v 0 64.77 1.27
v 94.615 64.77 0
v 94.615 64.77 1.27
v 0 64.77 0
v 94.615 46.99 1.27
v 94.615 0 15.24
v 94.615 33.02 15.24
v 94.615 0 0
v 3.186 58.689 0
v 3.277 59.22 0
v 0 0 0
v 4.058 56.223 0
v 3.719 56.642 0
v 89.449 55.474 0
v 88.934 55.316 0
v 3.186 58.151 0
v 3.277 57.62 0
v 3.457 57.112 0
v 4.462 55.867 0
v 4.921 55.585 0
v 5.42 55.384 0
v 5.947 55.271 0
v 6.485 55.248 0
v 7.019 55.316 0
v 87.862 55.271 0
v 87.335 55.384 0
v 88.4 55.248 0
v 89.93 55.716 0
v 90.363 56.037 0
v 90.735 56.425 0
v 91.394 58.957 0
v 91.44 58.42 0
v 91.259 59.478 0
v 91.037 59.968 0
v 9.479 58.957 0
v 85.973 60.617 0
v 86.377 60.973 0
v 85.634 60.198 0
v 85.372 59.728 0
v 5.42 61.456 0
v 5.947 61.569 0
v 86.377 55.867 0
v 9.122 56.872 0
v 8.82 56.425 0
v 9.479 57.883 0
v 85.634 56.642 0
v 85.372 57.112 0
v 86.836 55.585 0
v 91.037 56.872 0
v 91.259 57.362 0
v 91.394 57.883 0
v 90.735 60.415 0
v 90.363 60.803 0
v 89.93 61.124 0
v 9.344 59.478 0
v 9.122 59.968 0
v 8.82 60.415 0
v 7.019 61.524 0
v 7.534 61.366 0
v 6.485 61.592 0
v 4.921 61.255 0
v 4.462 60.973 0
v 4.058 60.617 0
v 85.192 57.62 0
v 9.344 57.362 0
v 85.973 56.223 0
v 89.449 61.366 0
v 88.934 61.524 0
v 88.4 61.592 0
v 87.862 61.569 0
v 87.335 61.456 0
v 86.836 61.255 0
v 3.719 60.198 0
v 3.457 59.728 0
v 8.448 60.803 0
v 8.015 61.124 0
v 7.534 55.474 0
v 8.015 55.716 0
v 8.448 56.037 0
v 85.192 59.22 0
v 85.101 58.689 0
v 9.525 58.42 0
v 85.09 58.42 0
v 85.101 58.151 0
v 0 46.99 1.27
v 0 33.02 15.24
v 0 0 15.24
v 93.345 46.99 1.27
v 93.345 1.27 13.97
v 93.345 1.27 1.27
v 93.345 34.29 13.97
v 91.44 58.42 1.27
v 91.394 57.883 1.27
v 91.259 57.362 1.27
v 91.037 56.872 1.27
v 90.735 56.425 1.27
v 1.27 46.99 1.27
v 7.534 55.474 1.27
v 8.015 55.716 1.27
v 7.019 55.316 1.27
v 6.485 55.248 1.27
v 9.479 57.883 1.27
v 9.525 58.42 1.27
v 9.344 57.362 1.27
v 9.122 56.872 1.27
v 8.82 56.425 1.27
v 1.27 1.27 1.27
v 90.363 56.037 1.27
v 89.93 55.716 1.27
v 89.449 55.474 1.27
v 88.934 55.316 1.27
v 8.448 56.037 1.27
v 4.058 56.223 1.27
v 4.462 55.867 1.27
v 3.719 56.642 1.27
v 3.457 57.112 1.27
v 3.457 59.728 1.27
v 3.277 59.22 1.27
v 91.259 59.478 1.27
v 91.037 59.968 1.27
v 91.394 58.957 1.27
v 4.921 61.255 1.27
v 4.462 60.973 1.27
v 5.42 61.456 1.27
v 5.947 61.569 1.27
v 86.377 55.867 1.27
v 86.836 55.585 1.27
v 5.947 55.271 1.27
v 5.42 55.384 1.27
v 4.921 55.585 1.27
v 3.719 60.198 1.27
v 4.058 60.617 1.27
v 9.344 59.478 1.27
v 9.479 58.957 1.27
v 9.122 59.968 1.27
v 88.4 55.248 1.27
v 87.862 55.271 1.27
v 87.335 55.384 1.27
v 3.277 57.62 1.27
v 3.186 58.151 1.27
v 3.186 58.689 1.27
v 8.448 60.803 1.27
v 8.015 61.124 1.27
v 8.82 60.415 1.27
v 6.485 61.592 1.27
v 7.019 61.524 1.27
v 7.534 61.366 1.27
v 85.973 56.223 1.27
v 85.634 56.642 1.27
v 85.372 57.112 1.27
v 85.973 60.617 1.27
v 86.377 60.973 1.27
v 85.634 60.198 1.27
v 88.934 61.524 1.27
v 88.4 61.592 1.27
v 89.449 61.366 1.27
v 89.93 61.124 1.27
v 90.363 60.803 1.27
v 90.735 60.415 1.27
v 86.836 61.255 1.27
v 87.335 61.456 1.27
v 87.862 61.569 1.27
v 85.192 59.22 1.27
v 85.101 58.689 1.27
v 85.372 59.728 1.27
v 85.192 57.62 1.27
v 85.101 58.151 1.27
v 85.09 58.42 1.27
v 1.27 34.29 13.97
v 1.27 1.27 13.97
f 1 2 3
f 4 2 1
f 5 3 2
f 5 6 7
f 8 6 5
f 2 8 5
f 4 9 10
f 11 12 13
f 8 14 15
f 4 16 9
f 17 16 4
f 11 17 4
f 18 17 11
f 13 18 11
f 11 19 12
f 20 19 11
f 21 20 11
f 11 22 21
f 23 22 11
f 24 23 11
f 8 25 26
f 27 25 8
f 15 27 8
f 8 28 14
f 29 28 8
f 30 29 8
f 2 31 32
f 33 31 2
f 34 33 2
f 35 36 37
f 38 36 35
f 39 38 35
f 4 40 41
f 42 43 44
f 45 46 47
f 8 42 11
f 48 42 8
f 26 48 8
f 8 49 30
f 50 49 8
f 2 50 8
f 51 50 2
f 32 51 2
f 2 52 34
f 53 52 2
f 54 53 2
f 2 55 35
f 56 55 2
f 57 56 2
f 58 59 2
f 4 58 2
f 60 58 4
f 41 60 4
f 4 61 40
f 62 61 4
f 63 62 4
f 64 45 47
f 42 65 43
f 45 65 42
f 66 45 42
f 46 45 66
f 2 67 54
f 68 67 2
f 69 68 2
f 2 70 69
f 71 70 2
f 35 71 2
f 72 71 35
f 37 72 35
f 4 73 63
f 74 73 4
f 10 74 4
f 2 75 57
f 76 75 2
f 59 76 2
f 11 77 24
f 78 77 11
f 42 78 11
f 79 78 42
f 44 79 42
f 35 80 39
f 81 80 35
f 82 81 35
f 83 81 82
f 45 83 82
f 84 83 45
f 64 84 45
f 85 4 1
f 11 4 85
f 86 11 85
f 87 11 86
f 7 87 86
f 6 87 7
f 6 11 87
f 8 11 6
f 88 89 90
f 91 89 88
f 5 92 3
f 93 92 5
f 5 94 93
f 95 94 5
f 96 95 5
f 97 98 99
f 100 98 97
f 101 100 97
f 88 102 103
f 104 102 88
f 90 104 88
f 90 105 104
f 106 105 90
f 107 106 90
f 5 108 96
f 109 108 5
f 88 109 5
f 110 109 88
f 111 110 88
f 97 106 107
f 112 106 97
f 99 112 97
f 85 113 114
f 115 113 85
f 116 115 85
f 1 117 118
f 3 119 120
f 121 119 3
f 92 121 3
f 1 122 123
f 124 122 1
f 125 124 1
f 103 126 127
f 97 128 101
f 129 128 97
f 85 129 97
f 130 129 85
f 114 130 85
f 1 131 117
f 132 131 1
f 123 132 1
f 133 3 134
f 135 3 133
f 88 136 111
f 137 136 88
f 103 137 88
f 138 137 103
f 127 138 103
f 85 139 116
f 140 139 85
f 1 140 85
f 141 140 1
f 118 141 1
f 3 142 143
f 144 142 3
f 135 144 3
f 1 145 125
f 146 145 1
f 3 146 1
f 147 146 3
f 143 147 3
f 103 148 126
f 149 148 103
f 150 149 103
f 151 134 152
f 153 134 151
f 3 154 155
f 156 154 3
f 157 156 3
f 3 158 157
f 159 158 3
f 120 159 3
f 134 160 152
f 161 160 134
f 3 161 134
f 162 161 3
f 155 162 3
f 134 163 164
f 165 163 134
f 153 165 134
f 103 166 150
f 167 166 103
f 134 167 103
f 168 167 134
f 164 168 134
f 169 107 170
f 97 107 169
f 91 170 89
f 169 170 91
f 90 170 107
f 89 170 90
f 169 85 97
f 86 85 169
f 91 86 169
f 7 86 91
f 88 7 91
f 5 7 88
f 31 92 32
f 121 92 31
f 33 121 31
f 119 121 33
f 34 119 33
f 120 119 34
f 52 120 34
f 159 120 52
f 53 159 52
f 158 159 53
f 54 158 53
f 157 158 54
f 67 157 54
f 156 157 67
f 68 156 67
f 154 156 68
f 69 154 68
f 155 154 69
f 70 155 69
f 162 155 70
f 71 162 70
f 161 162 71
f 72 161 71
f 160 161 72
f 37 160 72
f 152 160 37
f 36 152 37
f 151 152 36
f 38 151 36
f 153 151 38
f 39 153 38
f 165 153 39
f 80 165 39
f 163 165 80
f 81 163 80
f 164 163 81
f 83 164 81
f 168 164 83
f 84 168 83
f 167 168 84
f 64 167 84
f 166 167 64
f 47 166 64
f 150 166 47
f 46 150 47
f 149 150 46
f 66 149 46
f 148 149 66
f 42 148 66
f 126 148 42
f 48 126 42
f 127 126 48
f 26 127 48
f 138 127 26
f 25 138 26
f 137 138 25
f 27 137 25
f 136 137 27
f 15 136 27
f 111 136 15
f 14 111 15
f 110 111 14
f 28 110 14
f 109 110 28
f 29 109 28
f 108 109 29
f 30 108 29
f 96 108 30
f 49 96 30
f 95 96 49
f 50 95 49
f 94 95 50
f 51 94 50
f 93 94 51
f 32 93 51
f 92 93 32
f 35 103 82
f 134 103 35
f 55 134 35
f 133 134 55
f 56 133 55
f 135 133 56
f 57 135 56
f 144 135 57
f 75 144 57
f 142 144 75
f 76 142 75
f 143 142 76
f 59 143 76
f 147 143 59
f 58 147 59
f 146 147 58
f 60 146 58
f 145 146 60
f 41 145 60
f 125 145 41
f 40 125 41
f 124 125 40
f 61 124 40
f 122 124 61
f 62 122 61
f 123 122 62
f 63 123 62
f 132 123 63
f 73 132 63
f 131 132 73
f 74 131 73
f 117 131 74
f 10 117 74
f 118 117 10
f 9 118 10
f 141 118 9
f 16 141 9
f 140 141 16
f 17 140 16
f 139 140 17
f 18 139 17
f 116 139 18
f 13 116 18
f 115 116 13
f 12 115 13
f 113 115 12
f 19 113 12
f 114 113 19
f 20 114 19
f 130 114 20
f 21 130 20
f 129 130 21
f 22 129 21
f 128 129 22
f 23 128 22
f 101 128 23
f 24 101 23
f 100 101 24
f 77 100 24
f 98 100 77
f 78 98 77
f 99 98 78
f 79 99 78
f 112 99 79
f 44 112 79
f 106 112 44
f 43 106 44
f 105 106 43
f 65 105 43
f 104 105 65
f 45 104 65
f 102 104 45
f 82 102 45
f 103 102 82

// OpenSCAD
module object1(scale) {polyhedron( points=[[94.61499786376953,64.77000427246094,1.2699998617172241],[94.61499786376953,64.77000427246094,0],[0,64.77000427246094,1.2699998617172241],[0,64.77000427246094,1.2699998617172241],[94.61499786376953,64.77000427246094,0],[0,64.77000427246094,0],[94.61499786376953,64.77000427246094,0],[94.61499786376953,64.77000427246094,1.2699998617172241],[94.61499786376953,46.98999786376953,1.2699998617172241],[94.61499786376953,33.02000045776367,15.239999771118164],[94.61499786376953,0,15.239999771118164],[94.61499786376953,46.98999786376953,1.2699998617172241],[94.61499786376953,46.98999786376953,1.2699998617172241],[94.61499786376953,0,15.239999771118164],[94.61499786376953,0,0],[94.61499786376953,46.98999786376953,1.2699998617172241],[94.61499786376953,0,0],[94.61499786376953,64.77000427246094,0],[3.277446985244751,59.22003173828125,0],[3.1864383220672607,58.68925857543945,0],[0,64.77000427246094,0],[3.7194788455963135,56.64208221435547,0],[4.0577874183654785,56.22309494018555,0],[0,0,0],[88.93389892578125,55.316261291503906,0],[89.44881439208984,55.47395324707031,0],[94.61499786376953,0,0],[3.1864383220672607,58.68925857543945,0],[3.1864383220672607,58.15074157714844,0],[0,64.77000427246094,0],[0,64.77000427246094,0],[3.1864383220672607,58.15074157714844,0],[3.277446985244751,57.61996841430664,0],[0,64.77000427246094,0],[3.277446985244751,57.61996841430664,0],[0,0,0],[0,0,0],[3.277446985244751,57.61996841430664,0],[3.4568495750427246,57.112213134765625,0],[0,0,0],[3.4568495750427246,57.112213134765625,0],[3.7194788455963135,56.64208221435547,0],[4.0577874183654785,56.22309494018555,0],[4.462037086486816,55.8673095703125,0],[0,0,0],[0,0,0],[4.462037086486816,55.8673095703125,0],[4.920601844787598,55.5849609375,0],[0,0,0],[4.920601844787598,55.5849609375,0],[5.420286178588867,55.38417053222656,0],[5.420286178588867,55.38417053222656,0],[5.946718215942383,55.27071762084961,0],[0,0,0],[0,0,0],[5.946718215942383,55.27071762084961,0],[6.484750747680664,55.24786376953125,0],[0,0,0],[6.484750747680664,55.24786376953125,0],[7.018905162811279,55.316261291503906,0],[87.33528900146484,55.38417053222656,0],[87.8617172241211,55.27071762084961,0],[94.61499786376953,0,0],[94.61499786376953,0,0],[87.8617172241211,55.27071762084961,0],[88.39974975585938,55.24786376953125,0],[94.61499786376953,0,0],[88.39974975585938,55.24786376953125,0],[88.93389892578125,55.316261291503906,0],[89.44881439208984,55.47395324707031,0],[89.92967224121094,55.71639633178711,0],[94.61499786376953,0,0],[94.61499786376953,0,0],[89.92967224121094,55.71639633178711,0],[90.36264038085938,56.03661346435547,0],[94.61499786376953,0,0],[90.36264038085938,56.03661346435547,0],[90.73526763916016,56.42539978027344,0],[91.44000244140625,58.41999816894531,0],[91.39432525634766,58.95657730102539,0],[94.61499786376953,64.77000427246094,0],[94.61499786376953,64.77000427246094,0],[91.39432525634766,58.95657730102539,0],[91.25862884521484,59.47772216796875,0],[94.61499786376953,64.77000427246094,0],[91.25862884521484,59.47772216796875,0],[91.03681945800781,59.96842956542969,0],[86.37703704833984,60.97269058227539,0],[85.97278594970703,60.616905212402344,0],[9.479329109191895,58.95657730102539,0],[9.479329109191895,58.95657730102539,0],[85.97278594970703,60.616905212402344,0],[85.63448333740234,60.19791793823242,0],[9.479329109191895,58.95657730102539,0],[85.63448333740234,60.19791793823242,0],[85.3718490600586,59.727787017822266,0],[5.946718215942383,61.56928634643555,0],[5.420286178588867,61.45582962036133,0],[0,64.77000427246094,0],[8.82026195526123,56.42539978027344,0],[9.121820449829102,56.87156677246094,0],[86.37703704833984,55.8673095703125,0],[85.3718490600586,57.112213134765625,0],[85.63448333740234,56.64208221435547,0],[9.479329109191895,57.8834228515625,0],[0,0,0],[86.37703704833984,55.8673095703125,0],[94.61499786376953,0,0],[94.61499786376953,0,0],[86.37703704833984,55.8673095703125,0],[86.83560180664062,55.5849609375,0],[94.61499786376953,0,0],[86.83560180664062,55.5849609375,0],[87.33528900146484,55.38417053222656,0],[90.73526763916016,56.42539978027344,0],[91.03681945800781,56.87156677246094,0],[94.61499786376953,0,0],[94.61499786376953,0,0],[91.03681945800781,56.87156677246094,0],[91.25862884521484,57.362281799316406,0],[94.61499786376953,0,0],[91.25862884521484,57.362281799316406,0],[94.61499786376953,64.77000427246094,0],[94.61499786376953,64.77000427246094,0],[91.25862884521484,57.362281799316406,0],[91.39432525634766,57.8834228515625,0],[94.61499786376953,64.77000427246094,0],[91.39432525634766,57.8834228515625,0],[91.44000244140625,58.41999816894531,0],[91.03681945800781,59.96842956542969,0],[90.73526763916016,60.41459655761719,0],[94.61499786376953,64.77000427246094,0],[94.61499786376953,64.77000427246094,0],[90.73526763916016,60.41459655761719,0],[90.36264038085938,60.803382873535156,0],[94.61499786376953,64.77000427246094,0],[90.36264038085938,60.803382873535156,0],[89.92967224121094,61.12360763549805,0],[9.479329109191895,58.95657730102539,0],[9.343635559082031,59.47772216796875,0],[94.61499786376953,64.77000427246094,0],[94.61499786376953,64.77000427246094,0],[9.343635559082031,59.47772216796875,0],[9.121820449829102,59.96842956542969,0],[94.61499786376953,64.77000427246094,0],[9.121820449829102,59.96842956542969,0],[8.82026195526123,60.41459655761719,0],[94.61499786376953,64.77000427246094,0],[7.533818244934082,61.36604690551758,0],[7.018905162811279,61.523738861083984,0],[94.61499786376953,64.77000427246094,0],[7.018905162811279,61.523738861083984,0],[0,64.77000427246094,0],[0,64.77000427246094,0],[7.018905162811279,61.523738861083984,0],[6.484750747680664,61.592140197753906,0],[0,64.77000427246094,0],[6.484750747680664,61.592140197753906,0],[5.946718215942383,61.56928634643555,0],[5.420286178588867,61.45582962036133,0],[4.920601844787598,61.25503921508789,0],[0,64.77000427246094,0],[0,64.77000427246094,0],[4.920601844787598,61.25503921508789,0],[4.462037086486816,60.97269058227539,0],[0,64.77000427246094,0],[4.462037086486816,60.97269058227539,0],[4.0577874183654785,60.616905212402344,0],[85.3718490600586,57.112213134765625,0],[9.479329109191895,57.8834228515625,0],[85.19244384765625,57.61996841430664,0],[9.121820449829102,56.87156677246094,0],[9.343635559082031,57.362281799316406,0],[86.37703704833984,55.8673095703125,0],[86.37703704833984,55.8673095703125,0],[9.343635559082031,57.362281799316406,0],[9.479329109191895,57.8834228515625,0],[86.37703704833984,55.8673095703125,0],[9.479329109191895,57.8834228515625,0],[85.97278594970703,56.22309494018555,0],[85.97278594970703,56.22309494018555,0],[9.479329109191895,57.8834228515625,0],[85.63448333740234,56.64208221435547,0],[89.92967224121094,61.12360763549805,0],[89.44881439208984,61.36604690551758,0],[94.61499786376953,64.77000427246094,0],[94.61499786376953,64.77000427246094,0],[89.44881439208984,61.36604690551758,0],[88.93389892578125,61.523738861083984,0],[94.61499786376953,64.77000427246094,0],[88.93389892578125,61.523738861083984,0],[88.39974975585938,61.592140197753906,0],[88.39974975585938,61.592140197753906,0],[87.8617172241211,61.56928634643555,0],[94.61499786376953,64.77000427246094,0],[94.61499786376953,64.77000427246094,0],[87.8617172241211,61.56928634643555,0],[87.33528900146484,61.45582962036133,0],[94.61499786376953,64.77000427246094,0],[87.33528900146484,61.45582962036133,0],[9.479329109191895,58.95657730102539,0],[9.479329109191895,58.95657730102539,0],[87.33528900146484,61.45582962036133,0],[86.83560180664062,61.25503921508789,0],[9.479329109191895,58.95657730102539,0],[86.83560180664062,61.25503921508789,0],[86.37703704833984,60.97269058227539,0],[4.0577874183654785,60.616905212402344,0],[3.7194788455963135,60.19791793823242,0],[0,64.77000427246094,0],[0,64.77000427246094,0],[3.7194788455963135,60.19791793823242,0],[3.4568495750427246,59.727787017822266,0],[0,64.77000427246094,0],[3.4568495750427246,59.727787017822266,0],[3.277446985244751,59.22003173828125,0],[8.82026195526123,60.41459655761719,0],[8.447639465332031,60.803382873535156,0],[94.61499786376953,64.77000427246094,0],[94.61499786376953,64.77000427246094,0],[8.447639465332031,60.803382873535156,0],[8.01467514038086,61.12360763549805,0],[94.61499786376953,64.77000427246094,0],[8.01467514038086,61.12360763549805,0],[7.533818244934082,61.36604690551758,0],[7.018905162811279,55.316261291503906,0],[7.533818244934082,55.47395324707031,0],[0,0,0],[0,0,0],[7.533818244934082,55.47395324707031,0],[8.01467514038086,55.71639633178711,0],[0,0,0],[8.01467514038086,55.71639633178711,0],[86.37703704833984,55.8673095703125,0],[86.37703704833984,55.8673095703125,0],[8.01467514038086,55.71639633178711,0],[8.447639465332031,56.03661346435547,0],[86.37703704833984,55.8673095703125,0],[8.447639465332031,56.03661346435547,0],[8.82026195526123,56.42539978027344,0],[85.3718490600586,59.727787017822266,0],[85.19244384765625,59.22003173828125,0],[9.479329109191895,58.95657730102539,0],[9.479329109191895,58.95657730102539,0],[85.19244384765625,59.22003173828125,0],[85.1014404296875,58.68925857543945,0],[9.479329109191895,58.95657730102539,0],[85.1014404296875,58.68925857543945,0],[9.52499771118164,58.41999816894531,0],[9.52499771118164,58.41999816894531,0],[85.1014404296875,58.68925857543945,0],[85.08999633789062,58.41999816894531,0],[9.52499771118164,58.41999816894531,0],[85.08999633789062,58.41999816894531,0],[9.479329109191895,57.8834228515625,0],[9.479329109191895,57.8834228515625,0],[85.08999633789062,58.41999816894531,0],[85.1014404296875,58.15074157714844,0],[9.479329109191895,57.8834228515625,0],[85.1014404296875,58.15074157714844,0],[85.19244384765625,57.61996841430664,0],[0,64.77000427246094,1.2699998617172241],[0,64.77000427246094,0],[0,46.98999786376953,1.2699998617172241],[0,46.98999786376953,1.2699998617172241],[0,64.77000427246094,0],[0,0,0],[0,46.98999786376953,1.2699998617172241],[0,0,0],[0,33.02000045776367,15.239999771118164],[0,33.02000045776367,15.239999771118164],[0,0,0],[0,0,15.239999771118164],[0,33.02000045776367,15.239999771118164],[0,0,15.239999771118164],[94.61499786376953,33.02000045776367,15.239999771118164],[94.61499786376953,33.02000045776367,15.239999771118164],[0,0,15.239999771118164],[94.61499786376953,0,15.239999771118164],[0,0,15.239999771118164],[0,0,0],[94.61499786376953,0,15.239999771118164],[94.61499786376953,0,15.239999771118164],[0,0,0],[94.61499786376953,0,0],[93.34500122070312,1.2699999809265137,1.2699998617172241],[93.34500122070312,1.2699999809265137,13.969999313354492],[93.34500122070312,46.98999786376953,1.2699998617172241],[93.34500122070312,46.98999786376953,1.2699998617172241],[93.34500122070312,1.2699999809265137,13.969999313354492],[93.34500122070312,34.290000915527344,13.969999313354492],[94.61499786376953,64.77000427246094,1.2699998617172241],[91.44000244140625,58.41999816894531,1.2699998617172241],[94.61499786376953,46.98999786376953,1.2699998617172241],[94.61499786376953,46.98999786376953,1.2699998617172241],[91.44000244140625,58.41999816894531,1.2699998617172241],[91.39432525634766,57.8834228515625,1.2699998617172241],[91.39432525634766,57.8834228515625,1.2699998617172241],[91.25862884521484,57.362281799316406,1.2699998617172241],[94.61499786376953,46.98999786376953,1.2699998617172241],[94.61499786376953,46.98999786376953,1.2699998617172241],[91.25862884521484,57.362281799316406,1.2699998617172241],[91.03681945800781,56.87156677246094,1.2699998617172241],[94.61499786376953,46.98999786376953,1.2699998617172241],[91.03681945800781,56.87156677246094,1.2699998617172241],[90.73526763916016,56.42539978027344,1.2699998617172241],[8.01467514038086,55.71639633178711,1.2699998617172241],[7.533818244934082,55.47395324707031,1.2699998617172241],[1.2699998617172241,46.98999786376953,1.2699998617172241],[1.2699998617172241,46.98999786376953,1.2699998617172241],[7.533818244934082,55.47395324707031,1.2699998617172241],[7.018905162811279,55.316261291503906,1.2699998617172241],[1.2699998617172241,46.98999786376953,1.2699998617172241],[7.018905162811279,55.316261291503906,1.2699998617172241],[6.484750747680664,55.24786376953125,1.2699998617172241],[9.52499771118164,58.41999816894531,1.2699998617172241],[9.479329109191895,57.8834228515625,1.2699998617172241],[93.34500122070312,46.98999786376953,1.2699998617172241],[93.34500122070312,46.98999786376953,1.2699998617172241],[9.479329109191895,57.8834228515625,1.2699998617172241],[9.343635559082031,57.362281799316406,1.2699998617172241],[93.34500122070312,46.98999786376953,1.2699998617172241],[9.343635559082031,57.362281799316406,1.2699998617172241],[93.34500122070312,1.2699999809265137,1.2699998617172241],[9.343635559082031,57.362281799316406,1.2699998617172241],[9.121820449829102,56.87156677246094,1.2699998617172241],[93.34500122070312,1.2699999809265137,1.2699998617172241],[93.34500122070312,1.2699999809265137,1.2699998617172241],[9.121820449829102,56.87156677246094,1.2699998617172241],[8.82026195526123,56.42539978027344,1.2699998617172241],[93.34500122070312,1.2699999809265137,1.2699998617172241],[8.82026195526123,56.42539978027344,1.2699998617172241],[1.2699998617172241,1.2699999809265137,1.2699998617172241],[90.73526763916016,56.42539978027344,1.2699998617172241],[90.36264038085938,56.03661346435547,1.2699998617172241],[94.61499786376953,46.98999786376953,1.2699998617172241],[94.61499786376953,46.98999786376953,1.2699998617172241],[90.36264038085938,56.03661346435547,1.2699998617172241],[89.92967224121094,55.71639633178711,1.2699998617172241],[94.61499786376953,46.98999786376953,1.2699998617172241],[89.92967224121094,55.71639633178711,1.2699998617172241],[93.34500122070312,46.98999786376953,1.2699998617172241],[93.34500122070312,46.98999786376953,1.2699998617172241],[89.92967224121094,55.71639633178711,1.2699998617172241],[89.44881439208984,55.47395324707031,1.2699998617172241],[93.34500122070312,46.98999786376953,1.2699998617172241],[89.44881439208984,55.47395324707031,1.2699998617172241],[88.93389892578125,55.316261291503906,1.2699998617172241],[1.2699998617172241,1.2699999809265137,1.2699998617172241],[8.82026195526123,56.42539978027344,1.2699998617172241],[1.2699998617172241,46.98999786376953,1.2699998617172241],[1.2699998617172241,46.98999786376953,1.2699998617172241],[8.82026195526123,56.42539978027344,1.2699998617172241],[8.447639465332031,56.03661346435547,1.2699998617172241],[1.2699998617172241,46.98999786376953,1.2699998617172241],[8.447639465332031,56.03661346435547,1.2699998617172241],[8.01467514038086,55.71639633178711,1.2699998617172241],[4.462037086486816,55.8673095703125,1.2699998617172241],[4.0577874183654785,56.22309494018555,1.2699998617172241],[0,46.98999786376953,1.2699998617172241],[0,46.98999786376953,1.2699998617172241],[4.0577874183654785,56.22309494018555,1.2699998617172241],[3.7194788455963135,56.64208221435547,1.2699998617172241],[0,46.98999786376953,1.2699998617172241],[3.7194788455963135,56.64208221435547,1.2699998617172241],[3.4568495750427246,57.112213134765625,1.2699998617172241],[3.277446985244751,59.22003173828125,1.2699998617172241],[3.4568495750427246,59.727787017822266,1.2699998617172241],[0,64.77000427246094,1.2699998617172241],[91.03681945800781,59.96842956542969,1.2699998617172241],[91.25862884521484,59.47772216796875,1.2699998617172241],[94.61499786376953,64.77000427246094,1.2699998617172241],[94.61499786376953,64.77000427246094,1.2699998617172241],[91.25862884521484,59.47772216796875,1.2699998617172241],[91.39432525634766,58.95657730102539,1.2699998617172241],[94.61499786376953,64.77000427246094,1.2699998617172241],[91.39432525634766,58.95657730102539,1.2699998617172241],[91.44000244140625,58.41999816894531,1.2699998617172241],[4.462037086486816,60.97269058227539,1.2699998617172241],[4.920601844787598,61.25503921508789,1.2699998617172241],[0,64.77000427246094,1.2699998617172241],[0,64.77000427246094,1.2699998617172241],[4.920601844787598,61.25503921508789,1.2699998617172241],[5.420286178588867,61.45582962036133,1.2699998617172241],[0,64.77000427246094,1.2699998617172241],[5.420286178588867,61.45582962036133,1.2699998617172241],[5.946718215942383,61.56928634643555,1.2699998617172241],[86.83560180664062,55.5849609375,1.2699998617172241],[86.37703704833984,55.8673095703125,1.2699998617172241],[9.52499771118164,58.41999816894531,1.2699998617172241],[6.484750747680664,55.24786376953125,1.2699998617172241],[5.946718215942383,55.27071762084961,1.2699998617172241],[1.2699998617172241,46.98999786376953,1.2699998617172241],[1.2699998617172241,46.98999786376953,1.2699998617172241],[5.946718215942383,55.27071762084961,1.2699998617172241],[5.420286178588867,55.38417053222656,1.2699998617172241],[1.2699998617172241,46.98999786376953,1.2699998617172241],[5.420286178588867,55.38417053222656,1.2699998617172241],[0,46.98999786376953,1.2699998617172241],[0,46.98999786376953,1.2699998617172241],[5.420286178588867,55.38417053222656,1.2699998617172241],[4.920601844787598,55.5849609375,1.2699998617172241],[0,46.98999786376953,1.2699998617172241],[4.920601844787598,55.5849609375,1.2699998617172241],[4.462037086486816,55.8673095703125,1.2699998617172241],[3.4568495750427246,59.727787017822266,1.2699998617172241],[3.7194788455963135,60.19791793823242,1.2699998617172241],[0,64.77000427246094,1.2699998617172241],[0,64.77000427246094,1.2699998617172241],[3.7194788455963135,60.19791793823242,1.2699998617172241],[4.0577874183654785,60.616905212402344,1.2699998617172241],[0,64.77000427246094,1.2699998617172241],[4.0577874183654785,60.616905212402344,1.2699998617172241],[4.462037086486816,60.97269058227539,1.2699998617172241],[9.479329109191895,58.95657730102539,1.2699998617172241],[94.61499786376953,64.77000427246094,1.2699998617172241],[9.343635559082031,59.47772216796875,1.2699998617172241],[9.343635559082031,59.47772216796875,1.2699998617172241],[94.61499786376953,64.77000427246094,1.2699998617172241],[9.121820449829102,59.96842956542969,1.2699998617172241],[88.93389892578125,55.316261291503906,1.2699998617172241],[88.39974975585938,55.24786376953125,1.2699998617172241],[93.34500122070312,46.98999786376953,1.2699998617172241],[93.34500122070312,46.98999786376953,1.2699998617172241],[88.39974975585938,55.24786376953125,1.2699998617172241],[87.8617172241211,55.27071762084961,1.2699998617172241],[93.34500122070312,46.98999786376953,1.2699998617172241],[87.8617172241211,55.27071762084961,1.2699998617172241],[9.52499771118164,58.41999816894531,1.2699998617172241],[9.52499771118164,58.41999816894531,1.2699998617172241],[87.8617172241211,55.27071762084961,1.2699998617172241],[87.33528900146484,55.38417053222656,1.2699998617172241],[9.52499771118164,58.41999816894531,1.2699998617172241],[87.33528900146484,55.38417053222656,1.2699998617172241],[86.83560180664062,55.5849609375,1.2699998617172241],[3.4568495750427246,57.112213134765625,1.2699998617172241],[3.277446985244751,57.61996841430664,1.2699998617172241],[0,46.98999786376953,1.2699998617172241],[0,46.98999786376953,1.2699998617172241],[3.277446985244751,57.61996841430664,1.2699998617172241],[3.1864383220672607,58.15074157714844,1.2699998617172241],[0,46.98999786376953,1.2699998617172241],[3.1864383220672607,58.15074157714844,1.2699998617172241],[0,64.77000427246094,1.2699998617172241],[0,64.77000427246094,1.2699998617172241],[3.1864383220672607,58.15074157714844,1.2699998617172241],[3.1864383220672607,58.68925857543945,1.2699998617172241],[0,64.77000427246094,1.2699998617172241],[3.1864383220672607,58.68925857543945,1.2699998617172241],[3.277446985244751,59.22003173828125,1.2699998617172241],[8.01467514038086,61.12360763549805,1.2699998617172241],[8.447639465332031,60.803382873535156,1.2699998617172241],[94.61499786376953,64.77000427246094,1.2699998617172241],[94.61499786376953,64.77000427246094,1.2699998617172241],[8.447639465332031,60.803382873535156,1.2699998617172241],[8.82026195526123,60.41459655761719,1.2699998617172241],[94.61499786376953,64.77000427246094,1.2699998617172241],[8.82026195526123,60.41459655761719,1.2699998617172241],[9.121820449829102,59.96842956542969,1.2699998617172241],[5.946718215942383,61.56928634643555,1.2699998617172241],[6.484750747680664,61.592140197753906,1.2699998617172241],[0,64.77000427246094,1.2699998617172241],[0,64.77000427246094,1.2699998617172241],[6.484750747680664,61.592140197753906,1.2699998617172241],[7.018905162811279,61.523738861083984,1.2699998617172241],[0,64.77000427246094,1.2699998617172241],[7.018905162811279,61.523738861083984,1.2699998617172241],[94.61499786376953,64.77000427246094,1.2699998617172241],[94.61499786376953,64.77000427246094,1.2699998617172241],[7.018905162811279,61.523738861083984,1.2699998617172241],[7.533818244934082,61.36604690551758,1.2699998617172241],[94.61499786376953,64.77000427246094,1.2699998617172241],[7.533818244934082,61.36604690551758,1.2699998617172241],[8.01467514038086,61.12360763549805,1.2699998617172241],[86.37703704833984,55.8673095703125,1.2699998617172241],[85.97278594970703,56.22309494018555,1.2699998617172241],[9.52499771118164,58.41999816894531,1.2699998617172241],[9.52499771118164,58.41999816894531,1.2699998617172241],[85.97278594970703,56.22309494018555,1.2699998617172241],[85.63448333740234,56.64208221435547,1.2699998617172241],[9.52499771118164,58.41999816894531,1.2699998617172241],[85.63448333740234,56.64208221435547,1.2699998617172241],[85.3718490600586,57.112213134765625,1.2699998617172241],[86.37703704833984,60.97269058227539,1.2699998617172241],[9.479329109191895,58.95657730102539,1.2699998617172241],[85.97278594970703,60.616905212402344,1.2699998617172241],[85.97278594970703,60.616905212402344,1.2699998617172241],[9.479329109191895,58.95657730102539,1.2699998617172241],[85.63448333740234,60.19791793823242,1.2699998617172241],[88.39974975585938,61.592140197753906,1.2699998617172241],[88.93389892578125,61.523738861083984,1.2699998617172241],[94.61499786376953,64.77000427246094,1.2699998617172241],[94.61499786376953,64.77000427246094,1.2699998617172241],[88.93389892578125,61.523738861083984,1.2699998617172241],[89.44881439208984,61.36604690551758,1.2699998617172241],[94.61499786376953,64.77000427246094,1.2699998617172241],[89.44881439208984,61.36604690551758,1.2699998617172241],[89.92967224121094,61.12360763549805,1.2699998617172241],[89.92967224121094,61.12360763549805,1.2699998617172241],[90.36264038085938,60.803382873535156,1.2699998617172241],[94.61499786376953,64.77000427246094,1.2699998617172241],[94.61499786376953,64.77000427246094,1.2699998617172241],[90.36264038085938,60.803382873535156,1.2699998617172241],[90.73526763916016,60.41459655761719,1.2699998617172241],[94.61499786376953,64.77000427246094,1.2699998617172241],[90.73526763916016,60.41459655761719,1.2699998617172241],[91.03681945800781,59.96842956542969,1.2699998617172241],[86.37703704833984,60.97269058227539,1.2699998617172241],[86.83560180664062,61.25503921508789,1.2699998617172241],[9.479329109191895,58.95657730102539,1.2699998617172241],[9.479329109191895,58.95657730102539,1.2699998617172241],[86.83560180664062,61.25503921508789,1.2699998617172241],[87.33528900146484,61.45582962036133,1.2699998617172241],[9.479329109191895,58.95657730102539,1.2699998617172241],[87.33528900146484,61.45582962036133,1.2699998617172241],[94.61499786376953,64.77000427246094,1.2699998617172241],[94.61499786376953,64.77000427246094,1.2699998617172241],[87.33528900146484,61.45582962036133,1.2699998617172241],[87.8617172241211,61.56928634643555,1.2699998617172241],[94.61499786376953,64.77000427246094,1.2699998617172241],[87.8617172241211,61.56928634643555,1.2699998617172241],[88.39974975585938,61.592140197753906,1.2699998617172241],[85.1014404296875,58.68925857543945,1.2699998617172241],[85.19244384765625,59.22003173828125,1.2699998617172241],[9.479329109191895,58.95657730102539,1.2699998617172241],[9.479329109191895,58.95657730102539,1.2699998617172241],[85.19244384765625,59.22003173828125,1.2699998617172241],[85.3718490600586,59.727787017822266,1.2699998617172241],[9.479329109191895,58.95657730102539,1.2699998617172241],[85.3718490600586,59.727787017822266,1.2699998617172241],[85.63448333740234,60.19791793823242,1.2699998617172241],[85.3718490600586,57.112213134765625,1.2699998617172241],[85.19244384765625,57.61996841430664,1.2699998617172241],[9.52499771118164,58.41999816894531,1.2699998617172241],[9.52499771118164,58.41999816894531,1.2699998617172241],[85.19244384765625,57.61996841430664,1.2699998617172241],[85.1014404296875,58.15074157714844,1.2699998617172241],[9.52499771118164,58.41999816894531,1.2699998617172241],[85.1014404296875,58.15074157714844,1.2699998617172241],[9.479329109191895,58.95657730102539,1.2699998617172241],[9.479329109191895,58.95657730102539,1.2699998617172241],[85.1014404296875,58.15074157714844,1.2699998617172241],[85.08999633789062,58.41999816894531,1.2699998617172241],[9.479329109191895,58.95657730102539,1.2699998617172241],[85.08999633789062,58.41999816894531,1.2699998617172241],[85.1014404296875,58.68925857543945,1.2699998617172241],[1.2699998617172241,1.2699999809265137,13.969999313354492],[1.2699998617172241,1.2699999809265137,1.2699998617172241],[1.2699998617172241,34.290000915527344,13.969999313354492],[1.2699998617172241,34.290000915527344,13.969999313354492],[1.2699998617172241,1.2699999809265137,1.2699998617172241],[1.2699998617172241,46.98999786376953,1.2699998617172241],[93.34500122070312,1.2699999809265137,13.969999313354492],[1.2699998617172241,1.2699999809265137,13.969999313354492],[93.34500122070312,34.290000915527344,13.969999313354492],[93.34500122070312,34.290000915527344,13.969999313354492],[1.2699998617172241,1.2699999809265137,13.969999313354492],[1.2699998617172241,34.290000915527344,13.969999313354492],[1.2699998617172241,1.2699999809265137,1.2699998617172241],[1.2699998617172241,1.2699999809265137,13.969999313354492],[93.34500122070312,1.2699999809265137,1.2699998617172241],[93.34500122070312,1.2699999809265137,1.2699998617172241],[1.2699998617172241,1.2699999809265137,13.969999313354492],[93.34500122070312,1.2699999809265137,13.969999313354492],[1.2699998617172241,46.98999786376953,1.2699998617172241],[0,46.98999786376953,1.2699998617172241],[1.2699998617172241,34.290000915527344,13.969999313354492],[1.2699998617172241,34.290000915527344,13.969999313354492],[0,46.98999786376953,1.2699998617172241],[0,33.02000045776367,15.239999771118164],[1.2699998617172241,34.290000915527344,13.969999313354492],[0,33.02000045776367,15.239999771118164],[93.34500122070312,34.290000915527344,13.969999313354492],[93.34500122070312,34.290000915527344,13.969999313354492],[0,33.02000045776367,15.239999771118164],[94.61499786376953,33.02000045776367,15.239999771118164],[93.34500122070312,34.290000915527344,13.969999313354492],[94.61499786376953,33.02000045776367,15.239999771118164],[93.34500122070312,46.98999786376953,1.2699998617172241],[93.34500122070312,46.98999786376953,1.2699998617172241],[94.61499786376953,33.02000045776367,15.239999771118164],[94.61499786376953,46.98999786376953,1.2699998617172241],[91.44000244140625,58.41999816894531,0],[91.44000244140625,58.41999816894531,1.2699998617172241],[91.39432525634766,58.95657730102539,0],[91.39432525634766,58.95657730102539,0],[91.44000244140625,58.41999816894531,1.2699998617172241],[91.39432525634766,58.95657730102539,1.2699998617172241],[91.39432525634766,58.95657730102539,0],[91.39432525634766,58.95657730102539,1.2699998617172241],[91.25862884521484,59.47772216796875,0],[91.25862884521484,59.47772216796875,0],[91.39432525634766,58.95657730102539,1.2699998617172241],[91.25862884521484,59.47772216796875,1.2699998617172241],[91.25862884521484,59.47772216796875,0],[91.25862884521484,59.47772216796875,1.2699998617172241],[91.03681945800781,59.96842956542969,0],[91.03681945800781,59.96842956542969,0],[91.25862884521484,59.47772216796875,1.2699998617172241],[91.03681945800781,59.96842956542969,1.2699998617172241],[91.03681945800781,59.96842956542969,0],[91.03681945800781,59.96842956542969,1.2699998617172241],[90.73526763916016,60.41459655761719,0],[90.73526763916016,60.41459655761719,0],[91.03681945800781,59.96842956542969,1.2699998617172241],[90.73526763916016,60.41459655761719,1.2699998617172241],[90.73526763916016,60.41459655761719,0],[90.73526763916016,60.41459655761719,1.2699998617172241],[90.36264038085938,60.803382873535156,0],[90.36264038085938,60.803382873535156,0],[90.73526763916016,60.41459655761719,1.2699998617172241],[90.36264038085938,60.803382873535156,1.2699998617172241],[90.36264038085938,60.803382873535156,0],[90.36264038085938,60.803382873535156,1.2699998617172241],[89.92967224121094,61.12360763549805,0],[89.92967224121094,61.12360763549805,0],[90.36264038085938,60.803382873535156,1.2699998617172241],[89.92967224121094,61.12360763549805,1.2699998617172241],[89.92967224121094,61.12360763549805,0],[89.92967224121094,61.12360763549805,1.2699998617172241],[89.44881439208984,61.36604690551758,0],[89.44881439208984,61.36604690551758,0],[89.92967224121094,61.12360763549805,1.2699998617172241],[89.44881439208984,61.36604690551758,1.2699998617172241],[89.44881439208984,61.36604690551758,0],[89.44881439208984,61.36604690551758,1.2699998617172241],[88.93389892578125,61.523738861083984,0],[88.93389892578125,61.523738861083984,0],[89.44881439208984,61.36604690551758,1.2699998617172241],[88.93389892578125,61.523738861083984,1.2699998617172241],[88.93389892578125,61.523738861083984,0],[88.93389892578125,61.523738861083984,1.2699998617172241],[88.39974975585938,61.592140197753906,0],[88.39974975585938,61.592140197753906,0],[88.93389892578125,61.523738861083984,1.2699998617172241],[88.39974975585938,61.592140197753906,1.2699998617172241],[88.39974975585938,61.592140197753906,0],[88.39974975585938,61.592140197753906,1.2699998617172241],[87.8617172241211,61.56928634643555,0],[87.8617172241211,61.56928634643555,0],[88.39974975585938,61.592140197753906,1.2699998617172241],[87.8617172241211,61.56928634643555,1.2699998617172241],[87.8617172241211,61.56928634643555,0],[87.8617172241211,61.56928634643555,1.2699998617172241],[87.33528900146484,61.45582962036133,0],[87.33528900146484,61.45582962036133,0],[87.8617172241211,61.56928634643555,1.2699998617172241],[87.33528900146484,61.45582962036133,1.2699998617172241],[87.33528900146484,61.45582962036133,0],[87.33528900146484,61.45582962036133,1.2699998617172241],[86.83560180664062,61.25503921508789,0],[86.83560180664062,61.25503921508789,0],[87.33528900146484,61.45582962036133,1.2699998617172241],[86.83560180664062,61.25503921508789,1.2699998617172241],[86.83560180664062,61.25503921508789,0],[86.83560180664062,61.25503921508789,1.2699998617172241],[86.37703704833984,60.97269058227539,0],[86.37703704833984,60.97269058227539,0],[86.83560180664062,61.25503921508789,1.2699998617172241],[86.37703704833984,60.97269058227539,1.2699998617172241],[86.37703704833984,60.97269058227539,0],[86.37703704833984,60.97269058227539,1.2699998617172241],[85.97278594970703,60.616905212402344,0],[85.97278594970703,60.616905212402344,0],[86.37703704833984,60.97269058227539,1.2699998617172241],[85.97278594970703,60.616905212402344,1.2699998617172241],[85.97278594970703,60.616905212402344,0],[85.97278594970703,60.616905212402344,1.2699998617172241],[85.63448333740234,60.19791793823242,0],[85.63448333740234,60.19791793823242,0],[85.97278594970703,60.616905212402344,1.2699998617172241],[85.63448333740234,60.19791793823242,1.2699998617172241],[85.63448333740234,60.19791793823242,0],[85.63448333740234,60.19791793823242,1.2699998617172241],[85.3718490600586,59.727787017822266,0],[85.3718490600586,59.727787017822266,0],[85.63448333740234,60.19791793823242,1.2699998617172241],[85.3718490600586,59.727787017822266,1.2699998617172241],[85.3718490600586,59.727787017822266,0],[85.3718490600586,59.727787017822266,1.2699998617172241],[85.19244384765625,59.22003173828125,0],[85.19244384765625,59.22003173828125,0],[85.3718490600586,59.727787017822266,1.2699998617172241],[85.19244384765625,59.22003173828125,1.2699998617172241],[85.19244384765625,59.22003173828125,0],[85.19244384765625,59.22003173828125,1.2699998617172241],[85.1014404296875,58.68925857543945,0],[85.1014404296875,58.68925857543945,0],[85.19244384765625,59.22003173828125,1.2699998617172241],[85.1014404296875,58.68925857543945,1.2699998617172241],[85.1014404296875,58.68925857543945,0],[85.1014404296875,58.68925857543945,1.2699998617172241],[85.08999633789062,58.41999816894531,0],[85.08999633789062,58.41999816894531,0],[85.1014404296875,58.68925857543945,1.2699998617172241],[85.08999633789062,58.41999816894531,1.2699998617172241],[85.08999633789062,58.41999816894531,0],[85.08999633789062,58.41999816894531,1.2699998617172241],[85.1014404296875,58.15074157714844,0],[85.1014404296875,58.15074157714844,0],[85.08999633789062,58.41999816894531,1.2699998617172241],[85.1014404296875,58.15074157714844,1.2699998617172241],[85.1014404296875,58.15074157714844,0],[85.1014404296875,58.15074157714844,1.2699998617172241],[85.19244384765625,57.61996841430664,0],[85.19244384765625,57.61996841430664,0],[85.1014404296875,58.15074157714844,1.2699998617172241],[85.19244384765625,57.61996841430664,1.2699998617172241],[85.19244384765625,57.61996841430664,0],[85.19244384765625,57.61996841430664,1.2699998617172241],[85.3718490600586,57.112213134765625,0],[85.3718490600586,57.112213134765625,0],[85.19244384765625,57.61996841430664,1.2699998617172241],[85.3718490600586,57.112213134765625,1.2699998617172241],[85.3718490600586,57.112213134765625,0],[85.3718490600586,57.112213134765625,1.2699998617172241],[85.63448333740234,56.64208221435547,0],[85.63448333740234,56.64208221435547,0],[85.3718490600586,57.112213134765625,1.2699998617172241],[85.63448333740234,56.64208221435547,1.2699998617172241],[85.63448333740234,56.64208221435547,0],[85.63448333740234,56.64208221435547,1.2699998617172241],[85.97278594970703,56.22309494018555,0],[85.97278594970703,56.22309494018555,0],[85.63448333740234,56.64208221435547,1.2699998617172241],[85.97278594970703,56.22309494018555,1.2699998617172241],[85.97278594970703,56.22309494018555,0],[85.97278594970703,56.22309494018555,1.2699998617172241],[86.37703704833984,55.8673095703125,0],[86.37703704833984,55.8673095703125,0],[85.97278594970703,56.22309494018555,1.2699998617172241],[86.37703704833984,55.8673095703125,1.2699998617172241],[86.37703704833984,55.8673095703125,0],[86.37703704833984,55.8673095703125,1.2699998617172241],[86.83560180664062,55.5849609375,0],[86.83560180664062,55.5849609375,0],[86.37703704833984,55.8673095703125,1.2699998617172241],[86.83560180664062,55.5849609375,1.2699998617172241],[86.83560180664062,55.5849609375,0],[86.83560180664062,55.5849609375,1.2699998617172241],[87.33528900146484,55.38417053222656,0],[87.33528900146484,55.38417053222656,0],[86.83560180664062,55.5849609375,1.2699998617172241],[87.33528900146484,55.38417053222656,1.2699998617172241],[87.33528900146484,55.38417053222656,0],[87.33528900146484,55.38417053222656,1.2699998617172241],[87.8617172241211,55.27071762084961,0],[87.8617172241211,55.27071762084961,0],[87.33528900146484,55.38417053222656,1.2699998617172241],[87.8617172241211,55.27071762084961,1.2699998617172241],[87.8617172241211,55.27071762084961,0],[87.8617172241211,55.27071762084961,1.2699998617172241],[88.39974975585938,55.24786376953125,0],[88.39974975585938,55.24786376953125,0],[87.8617172241211,55.27071762084961,1.2699998617172241],[88.39974975585938,55.24786376953125,1.2699998617172241],[88.39974975585938,55.24786376953125,0],[88.39974975585938,55.24786376953125,1.2699998617172241],[88.93389892578125,55.316261291503906,0],[88.93389892578125,55.316261291503906,0],[88.39974975585938,55.24786376953125,1.2699998617172241],[88.93389892578125,55.316261291503906,1.2699998617172241],[88.93389892578125,55.316261291503906,0],[88.93389892578125,55.316261291503906,1.2699998617172241],[89.44881439208984,55.47395324707031,0],[89.44881439208984,55.47395324707031,0],[88.93389892578125,55.316261291503906,1.2699998617172241],[89.44881439208984,55.47395324707031,1.2699998617172241],[89.44881439208984,55.47395324707031,0],[89.44881439208984,55.47395324707031,1.2699998617172241],[89.92967224121094,55.71639633178711,0],[89.92967224121094,55.71639633178711,0],[89.44881439208984,55.47395324707031,1.2699998617172241],[89.92967224121094,55.71639633178711,1.2699998617172241],[89.92967224121094,55.71639633178711,0],[89.92967224121094,55.71639633178711,1.2699998617172241],[90.36264038085938,56.03661346435547,0],[90.36264038085938,56.03661346435547,0],[89.92967224121094,55.71639633178711,1.2699998617172241],[90.36264038085938,56.03661346435547,1.2699998617172241],[90.36264038085938,56.03661346435547,0],[90.36264038085938,56.03661346435547,1.2699998617172241],[90.73526763916016,56.42539978027344,0],[90.73526763916016,56.42539978027344,0],[90.36264038085938,56.03661346435547,1.2699998617172241],[90.73526763916016,56.42539978027344,1.2699998617172241],[90.73526763916016,56.42539978027344,0],[90.73526763916016,56.42539978027344,1.2699998617172241],[91.03681945800781,56.87156677246094,0],[91.03681945800781,56.87156677246094,0],[90.73526763916016,56.42539978027344,1.2699998617172241],[91.03681945800781,56.87156677246094,1.2699998617172241],[91.03681945800781,56.87156677246094,0],[91.03681945800781,56.87156677246094,1.2699998617172241],[91.25862884521484,57.362281799316406,0],[91.25862884521484,57.362281799316406,0],[91.03681945800781,56.87156677246094,1.2699998617172241],[91.25862884521484,57.362281799316406,1.2699998617172241],[91.25862884521484,57.362281799316406,0],[91.25862884521484,57.362281799316406,1.2699998617172241],[91.39432525634766,57.8834228515625,0],[91.39432525634766,57.8834228515625,0],[91.25862884521484,57.362281799316406,1.2699998617172241],[91.39432525634766,57.8834228515625,1.2699998617172241],[91.39432525634766,57.8834228515625,0],[91.39432525634766,57.8834228515625,1.2699998617172241],[91.44000244140625,58.41999816894531,0],[91.44000244140625,58.41999816894531,0],[91.39432525634766,57.8834228515625,1.2699998617172241],[91.44000244140625,58.41999816894531,1.2699998617172241],[9.52499771118164,58.41999816894531,0],[9.52499771118164,58.41999816894531,1.2699998617172241],[9.479329109191895,58.95657730102539,0],[9.479329109191895,58.95657730102539,0],[9.52499771118164,58.41999816894531,1.2699998617172241],[9.479329109191895,58.95657730102539,1.2699998617172241],[9.479329109191895,58.95657730102539,0],[9.479329109191895,58.95657730102539,1.2699998617172241],[9.343635559082031,59.47772216796875,0],[9.343635559082031,59.47772216796875,0],[9.479329109191895,58.95657730102539,1.2699998617172241],[9.343635559082031,59.47772216796875,1.2699998617172241],[9.343635559082031,59.47772216796875,0],[9.343635559082031,59.47772216796875,1.2699998617172241],[9.121820449829102,59.96842956542969,0],[9.121820449829102,59.96842956542969,0],[9.343635559082031,59.47772216796875,1.2699998617172241],[9.121820449829102,59.96842956542969,1.2699998617172241],[9.121820449829102,59.96842956542969,0],[9.121820449829102,59.96842956542969,1.2699998617172241],[8.82026195526123,60.41459655761719,0],[8.82026195526123,60.41459655761719,0],[9.121820449829102,59.96842956542969,1.2699998617172241],[8.82026195526123,60.41459655761719,1.2699998617172241],[8.82026195526123,60.41459655761719,0],[8.82026195526123,60.41459655761719,1.2699998617172241],[8.447639465332031,60.803382873535156,0],[8.447639465332031,60.803382873535156,0],[8.82026195526123,60.41459655761719,1.2699998617172241],[8.447639465332031,60.803382873535156,1.2699998617172241],[8.447639465332031,60.803382873535156,0],[8.447639465332031,60.803382873535156,1.2699998617172241],[8.01467514038086,61.12360763549805,0],[8.01467514038086,61.12360763549805,0],[8.447639465332031,60.803382873535156,1.2699998617172241],[8.01467514038086,61.12360763549805,1.2699998617172241],[8.01467514038086,61.12360763549805,0],[8.01467514038086,61.12360763549805,1.2699998617172241],[7.533818244934082,61.36604690551758,0],[7.533818244934082,61.36604690551758,0],[8.01467514038086,61.12360763549805,1.2699998617172241],[7.533818244934082,61.36604690551758,1.2699998617172241],[7.533818244934082,61.36604690551758,0],[7.533818244934082,61.36604690551758,1.2699998617172241],[7.018905162811279,61.523738861083984,0],[7.018905162811279,61.523738861083984,0],[7.533818244934082,61.36604690551758,1.2699998617172241],[7.018905162811279,61.523738861083984,1.2699998617172241],[7.018905162811279,61.523738861083984,0],[7.018905162811279,61.523738861083984,1.2699998617172241],[6.484750747680664,61.592140197753906,0],[6.484750747680664,61.592140197753906,0],[7.018905162811279,61.523738861083984,1.2699998617172241],[6.484750747680664,61.592140197753906,1.2699998617172241],[6.484750747680664,61.592140197753906,0],[6.484750747680664,61.592140197753906,1.2699998617172241],[5.946718215942383,61.56928634643555,0],[5.946718215942383,61.56928634643555,0],[6.484750747680664,61.592140197753906,1.2699998617172241],[5.946718215942383,61.56928634643555,1.2699998617172241],[5.946718215942383,61.56928634643555,0],[5.946718215942383,61.56928634643555,1.2699998617172241],[5.420286178588867,61.45582962036133,0],[5.420286178588867,61.45582962036133,0],[5.946718215942383,61.56928634643555,1.2699998617172241],[5.420286178588867,61.45582962036133,1.2699998617172241],[5.420286178588867,61.45582962036133,0],[5.420286178588867,61.45582962036133,1.2699998617172241],[4.920601844787598,61.25503921508789,0],[4.920601844787598,61.25503921508789,0],[5.420286178588867,61.45582962036133,1.2699998617172241],[4.920601844787598,61.25503921508789,1.2699998617172241],[4.920601844787598,61.25503921508789,0],[4.920601844787598,61.25503921508789,1.2699998617172241],[4.462037086486816,60.97269058227539,0],[4.462037086486816,60.97269058227539,0],[4.920601844787598,61.25503921508789,1.2699998617172241],[4.462037086486816,60.97269058227539,1.2699998617172241],[4.462037086486816,60.97269058227539,0],[4.462037086486816,60.97269058227539,1.2699998617172241],[4.0577874183654785,60.616905212402344,0],[4.0577874183654785,60.616905212402344,0],[4.462037086486816,60.97269058227539,1.2699998617172241],[4.0577874183654785,60.616905212402344,1.2699998617172241],[4.0577874183654785,60.616905212402344,0],[4.0577874183654785,60.616905212402344,1.2699998617172241],[3.7194788455963135,60.19791793823242,0],[3.7194788455963135,60.19791793823242,0],[4.0577874183654785,60.616905212402344,1.2699998617172241],[3.7194788455963135,60.19791793823242,1.2699998617172241],[3.7194788455963135,60.19791793823242,0],[3.7194788455963135,60.19791793823242,1.2699998617172241],[3.4568495750427246,59.727787017822266,0],[3.4568495750427246,59.727787017822266,0],[3.7194788455963135,60.19791793823242,1.2699998617172241],[3.4568495750427246,59.727787017822266,1.2699998617172241],[3.4568495750427246,59.727787017822266,0],[3.4568495750427246,59.727787017822266,1.2699998617172241],[3.277446985244751,59.22003173828125,0],[3.277446985244751,59.22003173828125,0],[3.4568495750427246,59.727787017822266,1.2699998617172241],[3.277446985244751,59.22003173828125,1.2699998617172241],[3.277446985244751,59.22003173828125,0],[3.277446985244751,59.22003173828125,1.2699998617172241],[3.1864383220672607,58.68925857543945,0],[3.1864383220672607,58.68925857543945,0],[3.277446985244751,59.22003173828125,1.2699998617172241],[3.1864383220672607,58.68925857543945,1.2699998617172241],[3.1864383220672607,58.68925857543945,0],[3.1864383220672607,58.68925857543945,1.2699998617172241],[3.1864383220672607,58.15074157714844,0],[3.1864383220672607,58.15074157714844,0],[3.1864383220672607,58.68925857543945,1.2699998617172241],[3.1864383220672607,58.15074157714844,1.2699998617172241],[3.1864383220672607,58.15074157714844,0],[3.1864383220672607,58.15074157714844,1.2699998617172241],[3.277446985244751,57.61996841430664,0],[3.277446985244751,57.61996841430664,0],[3.1864383220672607,58.15074157714844,1.2699998617172241],[3.277446985244751,57.61996841430664,1.2699998617172241],[3.277446985244751,57.61996841430664,0],[3.277446985244751,57.61996841430664,1.2699998617172241],[3.4568495750427246,57.112213134765625,0],[3.4568495750427246,57.112213134765625,0],[3.277446985244751,57.61996841430664,1.2699998617172241],[3.4568495750427246,57.112213134765625,1.2699998617172241],[3.4568495750427246,57.112213134765625,0],[3.4568495750427246,57.112213134765625,1.2699998617172241],[3.7194788455963135,56.64208221435547,0],[3.7194788455963135,56.64208221435547,0],[3.4568495750427246,57.112213134765625,1.2699998617172241],[3.7194788455963135,56.64208221435547,1.2699998617172241],[3.7194788455963135,56.64208221435547,0],[3.7194788455963135,56.64208221435547,1.2699998617172241],[4.0577874183654785,56.22309494018555,0],[4.0577874183654785,56.22309494018555,0],[3.7194788455963135,56.64208221435547,1.2699998617172241],[4.0577874183654785,56.22309494018555,1.2699998617172241],[4.0577874183654785,56.22309494018555,0],[4.0577874183654785,56.22309494018555,1.2699998617172241],[4.462037086486816,55.8673095703125,0],[4.462037086486816,55.8673095703125,0],[4.0577874183654785,56.22309494018555,1.2699998617172241],[4.462037086486816,55.8673095703125,1.2699998617172241],[4.462037086486816,55.8673095703125,0],[4.462037086486816,55.8673095703125,1.2699998617172241],[4.920601844787598,55.5849609375,0],[4.920601844787598,55.5849609375,0],[4.462037086486816,55.8673095703125,1.2699998617172241],[4.920601844787598,55.5849609375,1.2699998617172241],[4.920601844787598,55.5849609375,0],[4.920601844787598,55.5849609375,1.2699998617172241],[5.420286178588867,55.38417053222656,0],[5.420286178588867,55.38417053222656,0],[4.920601844787598,55.5849609375,1.2699998617172241],[5.420286178588867,55.38417053222656,1.2699998617172241],[5.420286178588867,55.38417053222656,0],[5.420286178588867,55.38417053222656,1.2699998617172241],[5.946718215942383,55.27071762084961,0],[5.946718215942383,55.27071762084961,0],[5.420286178588867,55.38417053222656,1.2699998617172241],[5.946718215942383,55.27071762084961,1.2699998617172241],[5.946718215942383,55.27071762084961,0],[5.946718215942383,55.27071762084961,1.2699998617172241],[6.484750747680664,55.24786376953125,0],[6.484750747680664,55.24786376953125,0],[5.946718215942383,55.27071762084961,1.2699998617172241],[6.484750747680664,55.24786376953125,1.2699998617172241],[6.484750747680664,55.24786376953125,0],[6.484750747680664,55.24786376953125,1.2699998617172241],[7.018905162811279,55.316261291503906,0],[7.018905162811279,55.316261291503906,0],[6.484750747680664,55.24786376953125,1.2699998617172241],[7.018905162811279,55.316261291503906,1.2699998617172241],[7.018905162811279,55.316261291503906,0],[7.018905162811279,55.316261291503906,1.2699998617172241],[7.533818244934082,55.47395324707031,0],[7.533818244934082,55.47395324707031,0],[7.018905162811279,55.316261291503906,1.2699998617172241],[7.533818244934082,55.47395324707031,1.2699998617172241],[7.533818244934082,55.47395324707031,0],[7.533818244934082,55.47395324707031,1.2699998617172241],[8.01467514038086,55.71639633178711,0],[8.01467514038086,55.71639633178711,0],[7.533818244934082,55.47395324707031,1.2699998617172241],[8.01467514038086,55.71639633178711,1.2699998617172241],[8.01467514038086,55.71639633178711,0],[8.01467514038086,55.71639633178711,1.2699998617172241],[8.447639465332031,56.03661346435547,0],[8.447639465332031,56.03661346435547,0],[8.01467514038086,55.71639633178711,1.2699998617172241],[8.447639465332031,56.03661346435547,1.2699998617172241],[8.447639465332031,56.03661346435547,0],[8.447639465332031,56.03661346435547,1.2699998617172241],[8.82026195526123,56.42539978027344,0],[8.82026195526123,56.42539978027344,0],[8.447639465332031,56.03661346435547,1.2699998617172241],[8.82026195526123,56.42539978027344,1.2699998617172241],[8.82026195526123,56.42539978027344,0],[8.82026195526123,56.42539978027344,1.2699998617172241],[9.121820449829102,56.87156677246094,0],[9.121820449829102,56.87156677246094,0],[8.82026195526123,56.42539978027344,1.2699998617172241],[9.121820449829102,56.87156677246094,1.2699998617172241],[9.121820449829102,56.87156677246094,0],[9.121820449829102,56.87156677246094,1.2699998617172241],[9.343635559082031,57.362281799316406,0],[9.343635559082031,57.362281799316406,0],[9.121820449829102,56.87156677246094,1.2699998617172241],[9.343635559082031,57.362281799316406,1.2699998617172241],[9.343635559082031,57.362281799316406,0],[9.343635559082031,57.362281799316406,1.2699998617172241],[9.479329109191895,57.8834228515625,0],[9.479329109191895,57.8834228515625,0],[9.343635559082031,57.362281799316406,1.2699998617172241],[9.479329109191895,57.8834228515625,1.2699998617172241],[9.479329109191895,57.8834228515625,0],[9.479329109191895,57.8834228515625,1.2699998617172241],[9.52499771118164,58.41999816894531,0],[9.52499771118164,58.41999816894531,0],[9.479329109191895,57.8834228515625,1.2699998617172241],[9.52499771118164,58.41999816894531,1.2699998617172241] ],faces=[[0,1,2],[3,4,5],[6,7,8],[9,10,11],[12,13,14],[15,16,17],[18,19,20],[21,22,23],[24,25,26],[27,28,29],[30,31,32],[33,34,35],[36,37,38],[39,40,41],[42,43,44],[45,46,47],[48,49,50],[51,52,53],[54,55,56],[57,58,59],[60,61,62],[63,64,65],[66,67,68],[69,70,71],[72,73,74],[75,76,77],[78,79,80],[81,82,83],[84,85,86],[87,88,89],[90,91,92],[93,94,95],[96,97,98],[99,100,101],[102,103,104],[105,106,107],[108,109,110],[111,112,113],[114,115,116],[117,118,119],[120,121,122],[123,124,125],[126,127,128],[129,130,131],[132,133,134],[135,136,137],[138,139,140],[141,142,143],[144,145,146],[147,148,149],[150,151,152],[153,154,155],[156,157,158],[159,160,161],[162,163,164],[165,166,167],[168,169,170],[171,172,173],[174,175,176],[177,178,179],[180,181,182],[183,184,185],[186,187,188],[189,190,191],[192,193,194],[195,196,197],[198,199,200],[201,202,203],[204,205,206],[207,208,209],[210,211,212],[213,214,215],[216,217,218],[219,220,221],[222,223,224],[225,226,227],[228,229,230],[231,232,233],[234,235,236],[237,238,239],[240,241,242],[243,244,245],[246,247,248],[249,250,251],[252,253,254],[255,256,257],[258,259,260],[261,262,263],[264,265,266],[267,268,269],[270,271,272],[273,274,275],[276,277,278],[279,280,281],[282,283,284],[285,286,287],[288,289,290],[291,292,293],[294,295,296],[297,298,299],[300,301,302],[303,304,305],[306,307,308],[309,310,311],[312,313,314],[315,316,317],[318,319,320],[321,322,323],[324,325,326],[327,328,329],[330,331,332],[333,334,335],[336,337,338],[339,340,341],[342,343,344],[345,346,347],[348,349,350],[351,352,353],[354,355,356],[357,358,359],[360,361,362],[363,364,365],[366,367,368],[369,370,371],[372,373,374],[375,376,377],[378,379,380],[381,382,383],[384,385,386],[387,388,389],[390,391,392],[393,394,395],[396,397,398],[399,400,401],[402,403,404],[405,406,407],[408,409,410],[411,412,413],[414,415,416],[417,418,419],[420,421,422],[423,424,425],[426,427,428],[429,430,431],[432,433,434],[435,436,437],[438,439,440],[441,442,443],[444,445,446],[447,448,449],[450,451,452],[453,454,455],[456,457,458],[459,460,461],[462,463,464],[465,466,467],[468,469,470],[471,472,473],[474,475,476],[477,478,479],[480,481,482],[483,484,485],[486,487,488],[489,490,491],[492,493,494],[495,496,497],[498,499,500],[501,502,503],[504,505,506],[507,508,509],[510,511,512],[513,514,515],[516,517,518],[519,520,521],[522,523,524],[525,526,527],[528,529,530],[531,532,533],[534,535,536],[537,538,539],[540,541,542],[543,544,545],[546,547,548],[549,550,551],[552,553,554],[555,556,557],[558,559,560],[561,562,563],[564,565,566],[567,568,569],[570,571,572],[573,574,575],[576,577,578],[579,580,581],[582,583,584],[585,586,587],[588,589,590],[591,592,593],[594,595,596],[597,598,599],[600,601,602],[603,604,605],[606,607,608],[609,610,611],[612,613,614],[615,616,617],[618,619,620],[621,622,623],[624,625,626],[627,628,629],[630,631,632],[633,634,635],[636,637,638],[639,640,641],[642,643,644],[645,646,647],[648,649,650],[651,652,653],[654,655,656],[657,658,659],[660,661,662],[663,664,665],[666,667,668],[669,670,671],[672,673,674],[675,676,677],[678,679,680],[681,682,683],[684,685,686],[687,688,689],[690,691,692],[693,694,695],[696,697,698],[699,700,701],[702,703,704],[705,706,707],[708,709,710],[711,712,713],[714,715,716],[717,718,719],[720,721,722],[723,724,725],[726,727,728],[729,730,731],[732,733,734],[735,736,737],[738,739,740],[741,742,743],[744,745,746],[747,748,749],[750,751,752],[753,754,755],[756,757,758],[759,760,761],[762,763,764],[765,766,767],[768,769,770],[771,772,773],[774,775,776],[777,778,779],[780,781,782],[783,784,785],[786,787,788],[789,790,791],[792,793,794],[795,796,797],[798,799,800],[801,802,803],[804,805,806],[807,808,809],[810,811,812],[813,814,815],[816,817,818],[819,820,821],[822,823,824],[825,826,827],[828,829,830],[831,832,833],[834,835,836],[837,838,839],[840,841,842],[843,844,845],[846,847,848],[849,850,851],[852,853,854],[855,856,857],[858,859,860],[861,862,863],[864,865,866],[867,868,869],[870,871,872],[873,874,875],[876,877,878],[879,880,881],[882,883,884],[885,886,887],[888,889,890],[891,892,893],[894,895,896],[897,898,899],[900,901,902],[903,904,905],[906,907,908],[909,910,911],[912,913,914],[915,916,917],[918,919,920],[921,922,923],[924,925,926],[927,928,929],[930,931,932],[933,934,935],[936,937,938],[939,940,941],[942,943,944],[945,946,947],[948,949,950],[951,952,953],[954,955,956],[957,958,959],[960,961,962],[963,964,965],[966,967,968],[969,970,971],[972,973,974],[975,976,977],[978,979,980],[981,982,983],[984,985,986],[987,988,989],[990,991,992],[993,994,995],[996,997,998],[999,1000,1001],[1002,1003,1004],[1005,1006,1007],[1008,1009,1010],[1011,1012,1013],[1014,1015,1016],[1017,1018,1019],[1020,1021,1022],[1023,1024,1025],[1026,1027,1028],[1029,1030,1031]]);}object1(1);
